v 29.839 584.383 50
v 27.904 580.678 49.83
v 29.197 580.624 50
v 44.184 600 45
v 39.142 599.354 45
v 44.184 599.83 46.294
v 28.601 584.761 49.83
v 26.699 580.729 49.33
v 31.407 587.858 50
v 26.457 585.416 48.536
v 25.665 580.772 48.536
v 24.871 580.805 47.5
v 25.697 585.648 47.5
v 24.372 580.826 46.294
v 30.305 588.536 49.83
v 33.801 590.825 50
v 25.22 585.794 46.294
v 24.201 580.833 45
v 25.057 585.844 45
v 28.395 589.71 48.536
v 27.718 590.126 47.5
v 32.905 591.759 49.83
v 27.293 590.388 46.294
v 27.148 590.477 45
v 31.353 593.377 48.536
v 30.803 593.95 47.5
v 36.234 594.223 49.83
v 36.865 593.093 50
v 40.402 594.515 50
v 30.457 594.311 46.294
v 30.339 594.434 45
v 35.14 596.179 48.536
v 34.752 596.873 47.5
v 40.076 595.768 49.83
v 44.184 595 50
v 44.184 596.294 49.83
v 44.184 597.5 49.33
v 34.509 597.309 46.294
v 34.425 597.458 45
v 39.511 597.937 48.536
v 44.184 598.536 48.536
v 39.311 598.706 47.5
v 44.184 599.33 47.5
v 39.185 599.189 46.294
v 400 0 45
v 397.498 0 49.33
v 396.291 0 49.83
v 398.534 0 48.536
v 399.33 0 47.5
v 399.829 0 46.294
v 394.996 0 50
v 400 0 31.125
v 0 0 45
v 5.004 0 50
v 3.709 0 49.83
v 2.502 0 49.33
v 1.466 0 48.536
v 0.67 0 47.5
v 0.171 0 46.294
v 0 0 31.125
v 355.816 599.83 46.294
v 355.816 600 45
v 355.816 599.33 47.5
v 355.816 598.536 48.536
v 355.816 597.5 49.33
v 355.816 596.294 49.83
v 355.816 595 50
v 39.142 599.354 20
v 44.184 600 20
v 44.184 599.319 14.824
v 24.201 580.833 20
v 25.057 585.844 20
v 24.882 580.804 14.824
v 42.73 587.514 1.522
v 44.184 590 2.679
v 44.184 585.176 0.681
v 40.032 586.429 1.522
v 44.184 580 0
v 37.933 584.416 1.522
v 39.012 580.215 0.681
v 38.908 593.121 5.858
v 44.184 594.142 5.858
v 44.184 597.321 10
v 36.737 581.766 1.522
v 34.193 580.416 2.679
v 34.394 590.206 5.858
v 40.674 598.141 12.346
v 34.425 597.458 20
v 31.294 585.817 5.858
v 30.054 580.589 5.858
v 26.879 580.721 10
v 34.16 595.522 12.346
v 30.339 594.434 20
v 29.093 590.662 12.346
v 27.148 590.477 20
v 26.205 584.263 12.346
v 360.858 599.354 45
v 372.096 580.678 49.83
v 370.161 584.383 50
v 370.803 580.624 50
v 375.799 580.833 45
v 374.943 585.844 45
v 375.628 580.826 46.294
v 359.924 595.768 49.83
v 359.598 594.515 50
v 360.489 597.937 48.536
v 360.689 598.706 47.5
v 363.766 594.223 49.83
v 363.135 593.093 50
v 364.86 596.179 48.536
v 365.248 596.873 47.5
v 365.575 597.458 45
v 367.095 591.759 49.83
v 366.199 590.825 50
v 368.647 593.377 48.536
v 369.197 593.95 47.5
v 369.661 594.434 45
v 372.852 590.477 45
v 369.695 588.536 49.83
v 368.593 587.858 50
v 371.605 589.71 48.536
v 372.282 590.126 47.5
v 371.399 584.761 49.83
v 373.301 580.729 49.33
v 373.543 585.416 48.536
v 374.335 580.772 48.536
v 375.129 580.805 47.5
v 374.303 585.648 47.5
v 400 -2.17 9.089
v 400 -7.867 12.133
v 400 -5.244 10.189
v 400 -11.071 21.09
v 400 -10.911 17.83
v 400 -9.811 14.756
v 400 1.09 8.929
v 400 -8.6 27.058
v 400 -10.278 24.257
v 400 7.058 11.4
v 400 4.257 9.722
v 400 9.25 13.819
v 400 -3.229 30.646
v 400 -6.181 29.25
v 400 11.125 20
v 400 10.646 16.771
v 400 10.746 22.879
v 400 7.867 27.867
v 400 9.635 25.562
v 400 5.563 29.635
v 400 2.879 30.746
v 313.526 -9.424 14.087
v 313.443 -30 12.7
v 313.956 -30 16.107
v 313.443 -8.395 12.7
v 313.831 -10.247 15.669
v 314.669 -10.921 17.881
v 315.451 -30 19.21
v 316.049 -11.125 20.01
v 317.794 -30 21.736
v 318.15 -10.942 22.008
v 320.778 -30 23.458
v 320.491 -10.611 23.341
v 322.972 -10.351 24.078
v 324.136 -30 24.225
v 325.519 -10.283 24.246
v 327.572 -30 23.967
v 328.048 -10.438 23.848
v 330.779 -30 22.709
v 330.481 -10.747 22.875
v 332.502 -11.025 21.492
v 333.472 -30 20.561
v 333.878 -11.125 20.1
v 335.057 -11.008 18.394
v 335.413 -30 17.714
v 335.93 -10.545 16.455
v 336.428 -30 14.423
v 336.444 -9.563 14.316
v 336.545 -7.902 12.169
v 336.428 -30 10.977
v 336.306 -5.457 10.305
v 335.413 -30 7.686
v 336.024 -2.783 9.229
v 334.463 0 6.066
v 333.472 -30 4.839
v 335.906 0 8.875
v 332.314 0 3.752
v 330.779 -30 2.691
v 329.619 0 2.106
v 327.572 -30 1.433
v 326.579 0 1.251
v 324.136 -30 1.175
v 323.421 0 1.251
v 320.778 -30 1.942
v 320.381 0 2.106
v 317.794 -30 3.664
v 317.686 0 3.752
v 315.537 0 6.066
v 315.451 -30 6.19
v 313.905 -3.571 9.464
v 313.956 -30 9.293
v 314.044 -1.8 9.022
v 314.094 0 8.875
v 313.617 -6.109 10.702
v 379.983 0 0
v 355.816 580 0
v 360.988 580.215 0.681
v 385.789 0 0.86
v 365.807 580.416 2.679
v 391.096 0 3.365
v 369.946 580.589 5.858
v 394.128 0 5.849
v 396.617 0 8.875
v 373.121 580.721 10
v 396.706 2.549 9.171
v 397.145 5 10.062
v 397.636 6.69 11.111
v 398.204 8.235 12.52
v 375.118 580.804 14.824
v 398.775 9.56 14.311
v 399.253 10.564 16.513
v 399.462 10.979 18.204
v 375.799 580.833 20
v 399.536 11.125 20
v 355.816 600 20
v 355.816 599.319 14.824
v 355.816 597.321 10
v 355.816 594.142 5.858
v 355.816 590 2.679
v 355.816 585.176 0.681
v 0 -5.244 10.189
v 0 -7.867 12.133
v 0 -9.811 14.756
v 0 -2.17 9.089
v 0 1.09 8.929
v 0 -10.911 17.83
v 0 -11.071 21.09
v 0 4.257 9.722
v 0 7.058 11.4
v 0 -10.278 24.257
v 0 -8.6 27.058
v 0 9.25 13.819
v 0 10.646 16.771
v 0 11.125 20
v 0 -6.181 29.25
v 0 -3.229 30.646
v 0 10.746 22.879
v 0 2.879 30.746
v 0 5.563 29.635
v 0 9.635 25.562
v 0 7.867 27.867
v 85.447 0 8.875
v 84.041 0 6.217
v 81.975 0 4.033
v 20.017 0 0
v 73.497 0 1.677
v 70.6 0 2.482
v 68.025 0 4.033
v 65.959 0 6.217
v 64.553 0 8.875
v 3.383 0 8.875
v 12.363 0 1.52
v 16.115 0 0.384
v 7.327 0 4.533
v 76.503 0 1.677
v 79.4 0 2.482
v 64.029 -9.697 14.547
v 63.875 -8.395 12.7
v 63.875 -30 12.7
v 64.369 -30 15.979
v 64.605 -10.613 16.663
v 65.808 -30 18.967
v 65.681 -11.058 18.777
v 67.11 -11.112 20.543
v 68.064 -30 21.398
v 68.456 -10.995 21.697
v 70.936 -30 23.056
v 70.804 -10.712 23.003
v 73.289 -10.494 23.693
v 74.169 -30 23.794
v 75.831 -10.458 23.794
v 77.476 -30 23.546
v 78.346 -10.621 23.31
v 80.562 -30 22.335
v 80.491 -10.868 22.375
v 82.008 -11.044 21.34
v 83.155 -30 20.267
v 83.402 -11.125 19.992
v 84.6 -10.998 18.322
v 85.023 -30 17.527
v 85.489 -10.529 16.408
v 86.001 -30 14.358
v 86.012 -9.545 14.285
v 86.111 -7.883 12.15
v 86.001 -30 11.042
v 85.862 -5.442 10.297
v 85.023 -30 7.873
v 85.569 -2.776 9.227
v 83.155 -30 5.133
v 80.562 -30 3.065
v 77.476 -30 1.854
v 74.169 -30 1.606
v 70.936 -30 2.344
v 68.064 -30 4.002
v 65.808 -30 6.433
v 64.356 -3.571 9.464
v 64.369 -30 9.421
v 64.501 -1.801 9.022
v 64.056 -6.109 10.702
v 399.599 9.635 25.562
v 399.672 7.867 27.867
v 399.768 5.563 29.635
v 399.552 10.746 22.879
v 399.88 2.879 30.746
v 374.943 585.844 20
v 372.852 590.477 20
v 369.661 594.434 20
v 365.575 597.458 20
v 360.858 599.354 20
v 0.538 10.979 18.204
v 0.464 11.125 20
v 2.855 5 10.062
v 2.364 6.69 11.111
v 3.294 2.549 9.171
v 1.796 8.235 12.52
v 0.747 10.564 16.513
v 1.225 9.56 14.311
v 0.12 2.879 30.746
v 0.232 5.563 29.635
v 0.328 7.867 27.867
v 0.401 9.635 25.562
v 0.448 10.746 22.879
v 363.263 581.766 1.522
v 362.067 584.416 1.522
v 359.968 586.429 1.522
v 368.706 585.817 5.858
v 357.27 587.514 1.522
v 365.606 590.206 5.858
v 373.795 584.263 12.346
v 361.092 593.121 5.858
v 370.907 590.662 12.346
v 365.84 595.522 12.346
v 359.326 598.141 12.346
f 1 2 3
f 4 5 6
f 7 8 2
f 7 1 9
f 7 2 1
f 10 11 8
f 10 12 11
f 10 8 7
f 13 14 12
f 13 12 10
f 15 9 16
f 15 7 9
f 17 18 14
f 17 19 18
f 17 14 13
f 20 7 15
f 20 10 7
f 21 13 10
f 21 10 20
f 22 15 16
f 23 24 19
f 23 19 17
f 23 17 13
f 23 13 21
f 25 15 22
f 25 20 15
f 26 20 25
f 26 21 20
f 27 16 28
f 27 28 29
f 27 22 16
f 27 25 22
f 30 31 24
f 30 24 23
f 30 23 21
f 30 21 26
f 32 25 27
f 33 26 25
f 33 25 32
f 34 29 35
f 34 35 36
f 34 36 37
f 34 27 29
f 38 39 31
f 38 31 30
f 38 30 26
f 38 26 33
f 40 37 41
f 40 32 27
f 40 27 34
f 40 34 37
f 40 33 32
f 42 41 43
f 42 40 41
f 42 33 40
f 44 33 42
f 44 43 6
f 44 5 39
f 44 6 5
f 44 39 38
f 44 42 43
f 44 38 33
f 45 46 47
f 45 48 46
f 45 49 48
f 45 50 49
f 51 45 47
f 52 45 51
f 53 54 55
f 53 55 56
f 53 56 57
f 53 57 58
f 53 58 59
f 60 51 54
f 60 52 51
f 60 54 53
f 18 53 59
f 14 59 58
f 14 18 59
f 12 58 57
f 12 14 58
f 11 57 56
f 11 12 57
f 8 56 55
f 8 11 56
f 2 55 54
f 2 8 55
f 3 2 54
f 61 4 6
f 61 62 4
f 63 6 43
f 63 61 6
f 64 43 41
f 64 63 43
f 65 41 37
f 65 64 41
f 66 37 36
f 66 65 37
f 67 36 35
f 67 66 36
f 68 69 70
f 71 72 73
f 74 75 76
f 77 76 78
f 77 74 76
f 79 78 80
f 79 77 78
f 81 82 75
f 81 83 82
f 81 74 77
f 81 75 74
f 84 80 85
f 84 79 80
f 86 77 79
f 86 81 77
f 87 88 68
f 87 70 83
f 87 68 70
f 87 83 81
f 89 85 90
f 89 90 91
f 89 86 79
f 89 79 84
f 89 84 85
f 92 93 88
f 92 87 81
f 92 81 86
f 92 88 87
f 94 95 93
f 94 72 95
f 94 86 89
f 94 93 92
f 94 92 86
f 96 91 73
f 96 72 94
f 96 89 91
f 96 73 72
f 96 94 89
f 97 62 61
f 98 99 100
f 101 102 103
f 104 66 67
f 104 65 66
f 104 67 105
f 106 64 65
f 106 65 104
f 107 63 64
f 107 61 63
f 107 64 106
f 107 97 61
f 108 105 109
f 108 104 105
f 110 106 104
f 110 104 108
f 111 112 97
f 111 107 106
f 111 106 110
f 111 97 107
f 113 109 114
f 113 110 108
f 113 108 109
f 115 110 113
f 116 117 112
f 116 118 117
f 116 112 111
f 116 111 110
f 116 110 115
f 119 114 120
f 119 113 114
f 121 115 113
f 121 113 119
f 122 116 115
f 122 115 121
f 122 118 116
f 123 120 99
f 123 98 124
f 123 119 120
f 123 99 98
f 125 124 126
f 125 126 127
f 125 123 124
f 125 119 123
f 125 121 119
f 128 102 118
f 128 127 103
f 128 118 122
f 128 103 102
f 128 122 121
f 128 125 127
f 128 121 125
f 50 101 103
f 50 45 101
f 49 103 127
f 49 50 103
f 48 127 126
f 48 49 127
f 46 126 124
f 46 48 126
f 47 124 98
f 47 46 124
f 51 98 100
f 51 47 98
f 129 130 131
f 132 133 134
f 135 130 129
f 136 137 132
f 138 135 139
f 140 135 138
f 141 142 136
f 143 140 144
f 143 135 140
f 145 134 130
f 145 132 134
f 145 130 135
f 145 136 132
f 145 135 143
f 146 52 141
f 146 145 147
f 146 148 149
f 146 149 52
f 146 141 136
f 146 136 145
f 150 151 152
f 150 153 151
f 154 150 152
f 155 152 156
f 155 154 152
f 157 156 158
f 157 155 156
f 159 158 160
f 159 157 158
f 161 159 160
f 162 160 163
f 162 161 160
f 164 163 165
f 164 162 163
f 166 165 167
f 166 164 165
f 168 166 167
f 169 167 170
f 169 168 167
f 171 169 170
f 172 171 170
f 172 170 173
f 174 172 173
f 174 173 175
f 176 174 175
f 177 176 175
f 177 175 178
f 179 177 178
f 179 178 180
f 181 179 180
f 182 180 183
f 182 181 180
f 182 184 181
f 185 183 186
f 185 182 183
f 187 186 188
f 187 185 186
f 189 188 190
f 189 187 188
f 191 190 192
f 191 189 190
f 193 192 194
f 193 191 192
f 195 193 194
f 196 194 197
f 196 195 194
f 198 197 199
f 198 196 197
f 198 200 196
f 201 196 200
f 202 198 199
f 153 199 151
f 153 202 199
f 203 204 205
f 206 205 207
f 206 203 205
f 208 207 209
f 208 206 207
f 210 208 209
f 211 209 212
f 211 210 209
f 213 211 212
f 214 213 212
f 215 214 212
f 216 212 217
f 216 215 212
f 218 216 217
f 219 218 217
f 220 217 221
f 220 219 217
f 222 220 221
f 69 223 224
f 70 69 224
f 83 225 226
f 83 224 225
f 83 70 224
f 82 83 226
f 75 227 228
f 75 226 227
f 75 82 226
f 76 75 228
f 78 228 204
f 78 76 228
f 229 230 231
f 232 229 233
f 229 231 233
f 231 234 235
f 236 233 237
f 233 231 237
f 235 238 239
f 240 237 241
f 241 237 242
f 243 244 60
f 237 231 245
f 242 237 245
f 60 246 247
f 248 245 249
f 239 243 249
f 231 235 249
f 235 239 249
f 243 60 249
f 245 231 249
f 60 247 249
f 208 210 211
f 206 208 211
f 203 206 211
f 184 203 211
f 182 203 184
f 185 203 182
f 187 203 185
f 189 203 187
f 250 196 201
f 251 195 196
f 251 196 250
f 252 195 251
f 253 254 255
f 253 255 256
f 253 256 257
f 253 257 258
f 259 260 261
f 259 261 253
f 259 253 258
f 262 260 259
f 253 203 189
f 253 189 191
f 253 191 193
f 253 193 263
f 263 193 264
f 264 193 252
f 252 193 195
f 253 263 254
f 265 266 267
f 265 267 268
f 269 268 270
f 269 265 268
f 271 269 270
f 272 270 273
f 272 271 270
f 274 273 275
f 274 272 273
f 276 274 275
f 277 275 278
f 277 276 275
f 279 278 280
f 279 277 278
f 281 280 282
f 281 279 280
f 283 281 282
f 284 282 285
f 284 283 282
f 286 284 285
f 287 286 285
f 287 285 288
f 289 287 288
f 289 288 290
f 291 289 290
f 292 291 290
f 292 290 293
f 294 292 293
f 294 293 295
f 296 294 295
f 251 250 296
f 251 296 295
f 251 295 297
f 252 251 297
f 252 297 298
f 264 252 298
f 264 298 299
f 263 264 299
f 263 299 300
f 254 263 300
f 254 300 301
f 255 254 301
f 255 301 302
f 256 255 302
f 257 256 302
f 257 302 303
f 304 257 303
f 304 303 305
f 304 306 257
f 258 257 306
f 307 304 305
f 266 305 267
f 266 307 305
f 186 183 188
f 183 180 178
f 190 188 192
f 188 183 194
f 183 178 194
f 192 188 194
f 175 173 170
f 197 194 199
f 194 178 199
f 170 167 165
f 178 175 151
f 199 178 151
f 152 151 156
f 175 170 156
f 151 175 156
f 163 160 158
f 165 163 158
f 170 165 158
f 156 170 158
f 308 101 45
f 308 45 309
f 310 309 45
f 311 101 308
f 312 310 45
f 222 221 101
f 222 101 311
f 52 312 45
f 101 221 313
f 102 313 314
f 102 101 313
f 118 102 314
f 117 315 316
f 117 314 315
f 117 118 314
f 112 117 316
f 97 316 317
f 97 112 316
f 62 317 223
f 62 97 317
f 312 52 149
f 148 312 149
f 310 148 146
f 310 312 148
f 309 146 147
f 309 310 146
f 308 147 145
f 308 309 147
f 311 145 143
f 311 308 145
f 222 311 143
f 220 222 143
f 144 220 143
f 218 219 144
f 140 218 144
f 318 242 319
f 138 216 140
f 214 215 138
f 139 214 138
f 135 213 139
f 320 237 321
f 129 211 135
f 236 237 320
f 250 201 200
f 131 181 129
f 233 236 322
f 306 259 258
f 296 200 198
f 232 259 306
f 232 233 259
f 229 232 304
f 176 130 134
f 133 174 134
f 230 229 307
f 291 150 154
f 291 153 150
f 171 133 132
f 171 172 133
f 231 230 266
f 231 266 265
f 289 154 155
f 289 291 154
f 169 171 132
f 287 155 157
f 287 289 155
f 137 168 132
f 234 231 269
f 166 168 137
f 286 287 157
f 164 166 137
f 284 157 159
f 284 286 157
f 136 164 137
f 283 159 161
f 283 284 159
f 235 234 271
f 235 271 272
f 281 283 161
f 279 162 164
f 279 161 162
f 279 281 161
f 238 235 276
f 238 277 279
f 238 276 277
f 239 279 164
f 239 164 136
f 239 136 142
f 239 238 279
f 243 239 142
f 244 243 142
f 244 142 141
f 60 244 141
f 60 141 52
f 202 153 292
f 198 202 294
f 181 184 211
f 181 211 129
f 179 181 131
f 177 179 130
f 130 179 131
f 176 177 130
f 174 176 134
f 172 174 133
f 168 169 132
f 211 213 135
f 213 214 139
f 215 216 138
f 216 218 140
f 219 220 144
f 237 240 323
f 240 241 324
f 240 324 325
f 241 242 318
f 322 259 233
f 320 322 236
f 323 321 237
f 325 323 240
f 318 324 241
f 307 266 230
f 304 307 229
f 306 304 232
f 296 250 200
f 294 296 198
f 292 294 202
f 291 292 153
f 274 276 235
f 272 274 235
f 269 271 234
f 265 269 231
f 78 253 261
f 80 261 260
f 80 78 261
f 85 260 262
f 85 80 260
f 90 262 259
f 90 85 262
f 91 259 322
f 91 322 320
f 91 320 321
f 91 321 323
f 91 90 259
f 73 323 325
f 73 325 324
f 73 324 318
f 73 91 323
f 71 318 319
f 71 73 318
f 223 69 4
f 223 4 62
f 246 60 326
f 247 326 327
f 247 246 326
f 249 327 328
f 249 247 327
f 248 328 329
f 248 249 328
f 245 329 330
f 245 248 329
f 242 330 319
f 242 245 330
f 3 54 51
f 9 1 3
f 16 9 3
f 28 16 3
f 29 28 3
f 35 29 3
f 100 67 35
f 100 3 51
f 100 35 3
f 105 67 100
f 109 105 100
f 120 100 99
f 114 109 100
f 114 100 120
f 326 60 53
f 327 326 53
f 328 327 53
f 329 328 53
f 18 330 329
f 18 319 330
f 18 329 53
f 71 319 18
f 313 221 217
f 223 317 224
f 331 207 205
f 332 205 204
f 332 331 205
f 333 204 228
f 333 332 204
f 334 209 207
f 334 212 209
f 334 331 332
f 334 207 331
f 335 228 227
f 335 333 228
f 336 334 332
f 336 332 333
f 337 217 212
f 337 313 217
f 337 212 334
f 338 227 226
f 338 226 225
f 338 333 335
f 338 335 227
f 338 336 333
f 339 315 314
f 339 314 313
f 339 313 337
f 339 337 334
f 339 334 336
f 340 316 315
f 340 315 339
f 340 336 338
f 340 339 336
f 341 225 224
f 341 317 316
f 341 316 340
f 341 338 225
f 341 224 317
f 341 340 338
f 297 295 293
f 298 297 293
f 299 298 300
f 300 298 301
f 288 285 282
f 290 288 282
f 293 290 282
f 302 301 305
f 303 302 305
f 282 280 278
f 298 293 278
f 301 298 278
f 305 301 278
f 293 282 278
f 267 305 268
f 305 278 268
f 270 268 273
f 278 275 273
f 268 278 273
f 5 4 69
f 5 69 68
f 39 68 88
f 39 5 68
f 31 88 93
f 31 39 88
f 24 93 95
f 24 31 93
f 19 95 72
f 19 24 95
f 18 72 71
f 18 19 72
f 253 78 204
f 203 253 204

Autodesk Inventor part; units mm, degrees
ref_plane "YZ Plane" through (0, 0, 0) normal (1, 0, 0) x (0, 1, 0)
ref_plane "XZ Plane" through (0, 0, 0) normal (0, 1, 0) x (-1, 0, 0)
ref_plane "XY Plane" through (0, 0, 0) normal (0, 0, 1) x (1, 0, 0)
sketch "Sketch1" plane through (0, 0, 0) normal (0, 0, 1) x (1, 0, 0)
  line L0 (0, 0) -> (25, 600)
  line L1 (25, 600) -> (375, 600)
  line L2 (375, 600) -> (400, 0)
  line L3 (400, 0) -> (0, 0)
  arc A0 (120.3096, 600) -> (279.6904, 600) centre (200, 673.1568) ccw
  line L4 (120.3096, 600) -> (25, 600)
  line L5 (25, 600) -> (0, 0)
  dimension "d0" = 600
  dimension "d1" = 25
  dimension "d2" = 350
  dimension "d3" = 400
  dimension "d4" = 175
extrude "Extrusion1" add sketch "Sketch1" along normal blind 50
fillet "Fillet1" radius 20 5 edges at (200, 600, 0) (387.5, 300, 0) (12.5, 300, 0) (25, 600, 25) (375, 600, 25)
fillet "Fillet2" radius 5 5 edges at (200, 600, 50) (30.3394, 594.4335, 50) (369.6606, 594.4335, 50) (387.8993, 290.4163, 50) (12.1007, 290.4163, 50)
sketch "Sketch2" plane through (0, 0, 0) normal (0, 0, 1) x (1, 0, 0)
  point P0 (0, 0)
sketch "Sketch3" plane through (0, 0, 0) normal (1, 0, 0) x (0, 1, 0)
  line L0 (0, 0) -> (0, 20) projected
  circle A0 centre (0, 20) radius 11.125
  dimension "d9" = 22.25
extrude "Extrusion2" add sketch "Sketch3" along normal blind 400
sketch "Sketch4" plane through (0, 0, 0) normal (0, 1, 0) x (-1, 0, 0)
  circle A0 centre (-325, 12.7) radius 11.5572
  circle A1 centre (-75, 12.7) radius 11.125
  line L0 (0, 31.125) -> (-400, 31.125) projected
  line L1 (-200, 31.125) -> (-350.8375, 31.125)
  point P0 (0, 0)
  dimension "d12" = 22.25
  dimension "d13" = 250
  dimension "d16" = 125
extrude "Extrusion3" add sketch "Sketch4" against normal blind 30
properties part number "backrest wheelchair EG26"
